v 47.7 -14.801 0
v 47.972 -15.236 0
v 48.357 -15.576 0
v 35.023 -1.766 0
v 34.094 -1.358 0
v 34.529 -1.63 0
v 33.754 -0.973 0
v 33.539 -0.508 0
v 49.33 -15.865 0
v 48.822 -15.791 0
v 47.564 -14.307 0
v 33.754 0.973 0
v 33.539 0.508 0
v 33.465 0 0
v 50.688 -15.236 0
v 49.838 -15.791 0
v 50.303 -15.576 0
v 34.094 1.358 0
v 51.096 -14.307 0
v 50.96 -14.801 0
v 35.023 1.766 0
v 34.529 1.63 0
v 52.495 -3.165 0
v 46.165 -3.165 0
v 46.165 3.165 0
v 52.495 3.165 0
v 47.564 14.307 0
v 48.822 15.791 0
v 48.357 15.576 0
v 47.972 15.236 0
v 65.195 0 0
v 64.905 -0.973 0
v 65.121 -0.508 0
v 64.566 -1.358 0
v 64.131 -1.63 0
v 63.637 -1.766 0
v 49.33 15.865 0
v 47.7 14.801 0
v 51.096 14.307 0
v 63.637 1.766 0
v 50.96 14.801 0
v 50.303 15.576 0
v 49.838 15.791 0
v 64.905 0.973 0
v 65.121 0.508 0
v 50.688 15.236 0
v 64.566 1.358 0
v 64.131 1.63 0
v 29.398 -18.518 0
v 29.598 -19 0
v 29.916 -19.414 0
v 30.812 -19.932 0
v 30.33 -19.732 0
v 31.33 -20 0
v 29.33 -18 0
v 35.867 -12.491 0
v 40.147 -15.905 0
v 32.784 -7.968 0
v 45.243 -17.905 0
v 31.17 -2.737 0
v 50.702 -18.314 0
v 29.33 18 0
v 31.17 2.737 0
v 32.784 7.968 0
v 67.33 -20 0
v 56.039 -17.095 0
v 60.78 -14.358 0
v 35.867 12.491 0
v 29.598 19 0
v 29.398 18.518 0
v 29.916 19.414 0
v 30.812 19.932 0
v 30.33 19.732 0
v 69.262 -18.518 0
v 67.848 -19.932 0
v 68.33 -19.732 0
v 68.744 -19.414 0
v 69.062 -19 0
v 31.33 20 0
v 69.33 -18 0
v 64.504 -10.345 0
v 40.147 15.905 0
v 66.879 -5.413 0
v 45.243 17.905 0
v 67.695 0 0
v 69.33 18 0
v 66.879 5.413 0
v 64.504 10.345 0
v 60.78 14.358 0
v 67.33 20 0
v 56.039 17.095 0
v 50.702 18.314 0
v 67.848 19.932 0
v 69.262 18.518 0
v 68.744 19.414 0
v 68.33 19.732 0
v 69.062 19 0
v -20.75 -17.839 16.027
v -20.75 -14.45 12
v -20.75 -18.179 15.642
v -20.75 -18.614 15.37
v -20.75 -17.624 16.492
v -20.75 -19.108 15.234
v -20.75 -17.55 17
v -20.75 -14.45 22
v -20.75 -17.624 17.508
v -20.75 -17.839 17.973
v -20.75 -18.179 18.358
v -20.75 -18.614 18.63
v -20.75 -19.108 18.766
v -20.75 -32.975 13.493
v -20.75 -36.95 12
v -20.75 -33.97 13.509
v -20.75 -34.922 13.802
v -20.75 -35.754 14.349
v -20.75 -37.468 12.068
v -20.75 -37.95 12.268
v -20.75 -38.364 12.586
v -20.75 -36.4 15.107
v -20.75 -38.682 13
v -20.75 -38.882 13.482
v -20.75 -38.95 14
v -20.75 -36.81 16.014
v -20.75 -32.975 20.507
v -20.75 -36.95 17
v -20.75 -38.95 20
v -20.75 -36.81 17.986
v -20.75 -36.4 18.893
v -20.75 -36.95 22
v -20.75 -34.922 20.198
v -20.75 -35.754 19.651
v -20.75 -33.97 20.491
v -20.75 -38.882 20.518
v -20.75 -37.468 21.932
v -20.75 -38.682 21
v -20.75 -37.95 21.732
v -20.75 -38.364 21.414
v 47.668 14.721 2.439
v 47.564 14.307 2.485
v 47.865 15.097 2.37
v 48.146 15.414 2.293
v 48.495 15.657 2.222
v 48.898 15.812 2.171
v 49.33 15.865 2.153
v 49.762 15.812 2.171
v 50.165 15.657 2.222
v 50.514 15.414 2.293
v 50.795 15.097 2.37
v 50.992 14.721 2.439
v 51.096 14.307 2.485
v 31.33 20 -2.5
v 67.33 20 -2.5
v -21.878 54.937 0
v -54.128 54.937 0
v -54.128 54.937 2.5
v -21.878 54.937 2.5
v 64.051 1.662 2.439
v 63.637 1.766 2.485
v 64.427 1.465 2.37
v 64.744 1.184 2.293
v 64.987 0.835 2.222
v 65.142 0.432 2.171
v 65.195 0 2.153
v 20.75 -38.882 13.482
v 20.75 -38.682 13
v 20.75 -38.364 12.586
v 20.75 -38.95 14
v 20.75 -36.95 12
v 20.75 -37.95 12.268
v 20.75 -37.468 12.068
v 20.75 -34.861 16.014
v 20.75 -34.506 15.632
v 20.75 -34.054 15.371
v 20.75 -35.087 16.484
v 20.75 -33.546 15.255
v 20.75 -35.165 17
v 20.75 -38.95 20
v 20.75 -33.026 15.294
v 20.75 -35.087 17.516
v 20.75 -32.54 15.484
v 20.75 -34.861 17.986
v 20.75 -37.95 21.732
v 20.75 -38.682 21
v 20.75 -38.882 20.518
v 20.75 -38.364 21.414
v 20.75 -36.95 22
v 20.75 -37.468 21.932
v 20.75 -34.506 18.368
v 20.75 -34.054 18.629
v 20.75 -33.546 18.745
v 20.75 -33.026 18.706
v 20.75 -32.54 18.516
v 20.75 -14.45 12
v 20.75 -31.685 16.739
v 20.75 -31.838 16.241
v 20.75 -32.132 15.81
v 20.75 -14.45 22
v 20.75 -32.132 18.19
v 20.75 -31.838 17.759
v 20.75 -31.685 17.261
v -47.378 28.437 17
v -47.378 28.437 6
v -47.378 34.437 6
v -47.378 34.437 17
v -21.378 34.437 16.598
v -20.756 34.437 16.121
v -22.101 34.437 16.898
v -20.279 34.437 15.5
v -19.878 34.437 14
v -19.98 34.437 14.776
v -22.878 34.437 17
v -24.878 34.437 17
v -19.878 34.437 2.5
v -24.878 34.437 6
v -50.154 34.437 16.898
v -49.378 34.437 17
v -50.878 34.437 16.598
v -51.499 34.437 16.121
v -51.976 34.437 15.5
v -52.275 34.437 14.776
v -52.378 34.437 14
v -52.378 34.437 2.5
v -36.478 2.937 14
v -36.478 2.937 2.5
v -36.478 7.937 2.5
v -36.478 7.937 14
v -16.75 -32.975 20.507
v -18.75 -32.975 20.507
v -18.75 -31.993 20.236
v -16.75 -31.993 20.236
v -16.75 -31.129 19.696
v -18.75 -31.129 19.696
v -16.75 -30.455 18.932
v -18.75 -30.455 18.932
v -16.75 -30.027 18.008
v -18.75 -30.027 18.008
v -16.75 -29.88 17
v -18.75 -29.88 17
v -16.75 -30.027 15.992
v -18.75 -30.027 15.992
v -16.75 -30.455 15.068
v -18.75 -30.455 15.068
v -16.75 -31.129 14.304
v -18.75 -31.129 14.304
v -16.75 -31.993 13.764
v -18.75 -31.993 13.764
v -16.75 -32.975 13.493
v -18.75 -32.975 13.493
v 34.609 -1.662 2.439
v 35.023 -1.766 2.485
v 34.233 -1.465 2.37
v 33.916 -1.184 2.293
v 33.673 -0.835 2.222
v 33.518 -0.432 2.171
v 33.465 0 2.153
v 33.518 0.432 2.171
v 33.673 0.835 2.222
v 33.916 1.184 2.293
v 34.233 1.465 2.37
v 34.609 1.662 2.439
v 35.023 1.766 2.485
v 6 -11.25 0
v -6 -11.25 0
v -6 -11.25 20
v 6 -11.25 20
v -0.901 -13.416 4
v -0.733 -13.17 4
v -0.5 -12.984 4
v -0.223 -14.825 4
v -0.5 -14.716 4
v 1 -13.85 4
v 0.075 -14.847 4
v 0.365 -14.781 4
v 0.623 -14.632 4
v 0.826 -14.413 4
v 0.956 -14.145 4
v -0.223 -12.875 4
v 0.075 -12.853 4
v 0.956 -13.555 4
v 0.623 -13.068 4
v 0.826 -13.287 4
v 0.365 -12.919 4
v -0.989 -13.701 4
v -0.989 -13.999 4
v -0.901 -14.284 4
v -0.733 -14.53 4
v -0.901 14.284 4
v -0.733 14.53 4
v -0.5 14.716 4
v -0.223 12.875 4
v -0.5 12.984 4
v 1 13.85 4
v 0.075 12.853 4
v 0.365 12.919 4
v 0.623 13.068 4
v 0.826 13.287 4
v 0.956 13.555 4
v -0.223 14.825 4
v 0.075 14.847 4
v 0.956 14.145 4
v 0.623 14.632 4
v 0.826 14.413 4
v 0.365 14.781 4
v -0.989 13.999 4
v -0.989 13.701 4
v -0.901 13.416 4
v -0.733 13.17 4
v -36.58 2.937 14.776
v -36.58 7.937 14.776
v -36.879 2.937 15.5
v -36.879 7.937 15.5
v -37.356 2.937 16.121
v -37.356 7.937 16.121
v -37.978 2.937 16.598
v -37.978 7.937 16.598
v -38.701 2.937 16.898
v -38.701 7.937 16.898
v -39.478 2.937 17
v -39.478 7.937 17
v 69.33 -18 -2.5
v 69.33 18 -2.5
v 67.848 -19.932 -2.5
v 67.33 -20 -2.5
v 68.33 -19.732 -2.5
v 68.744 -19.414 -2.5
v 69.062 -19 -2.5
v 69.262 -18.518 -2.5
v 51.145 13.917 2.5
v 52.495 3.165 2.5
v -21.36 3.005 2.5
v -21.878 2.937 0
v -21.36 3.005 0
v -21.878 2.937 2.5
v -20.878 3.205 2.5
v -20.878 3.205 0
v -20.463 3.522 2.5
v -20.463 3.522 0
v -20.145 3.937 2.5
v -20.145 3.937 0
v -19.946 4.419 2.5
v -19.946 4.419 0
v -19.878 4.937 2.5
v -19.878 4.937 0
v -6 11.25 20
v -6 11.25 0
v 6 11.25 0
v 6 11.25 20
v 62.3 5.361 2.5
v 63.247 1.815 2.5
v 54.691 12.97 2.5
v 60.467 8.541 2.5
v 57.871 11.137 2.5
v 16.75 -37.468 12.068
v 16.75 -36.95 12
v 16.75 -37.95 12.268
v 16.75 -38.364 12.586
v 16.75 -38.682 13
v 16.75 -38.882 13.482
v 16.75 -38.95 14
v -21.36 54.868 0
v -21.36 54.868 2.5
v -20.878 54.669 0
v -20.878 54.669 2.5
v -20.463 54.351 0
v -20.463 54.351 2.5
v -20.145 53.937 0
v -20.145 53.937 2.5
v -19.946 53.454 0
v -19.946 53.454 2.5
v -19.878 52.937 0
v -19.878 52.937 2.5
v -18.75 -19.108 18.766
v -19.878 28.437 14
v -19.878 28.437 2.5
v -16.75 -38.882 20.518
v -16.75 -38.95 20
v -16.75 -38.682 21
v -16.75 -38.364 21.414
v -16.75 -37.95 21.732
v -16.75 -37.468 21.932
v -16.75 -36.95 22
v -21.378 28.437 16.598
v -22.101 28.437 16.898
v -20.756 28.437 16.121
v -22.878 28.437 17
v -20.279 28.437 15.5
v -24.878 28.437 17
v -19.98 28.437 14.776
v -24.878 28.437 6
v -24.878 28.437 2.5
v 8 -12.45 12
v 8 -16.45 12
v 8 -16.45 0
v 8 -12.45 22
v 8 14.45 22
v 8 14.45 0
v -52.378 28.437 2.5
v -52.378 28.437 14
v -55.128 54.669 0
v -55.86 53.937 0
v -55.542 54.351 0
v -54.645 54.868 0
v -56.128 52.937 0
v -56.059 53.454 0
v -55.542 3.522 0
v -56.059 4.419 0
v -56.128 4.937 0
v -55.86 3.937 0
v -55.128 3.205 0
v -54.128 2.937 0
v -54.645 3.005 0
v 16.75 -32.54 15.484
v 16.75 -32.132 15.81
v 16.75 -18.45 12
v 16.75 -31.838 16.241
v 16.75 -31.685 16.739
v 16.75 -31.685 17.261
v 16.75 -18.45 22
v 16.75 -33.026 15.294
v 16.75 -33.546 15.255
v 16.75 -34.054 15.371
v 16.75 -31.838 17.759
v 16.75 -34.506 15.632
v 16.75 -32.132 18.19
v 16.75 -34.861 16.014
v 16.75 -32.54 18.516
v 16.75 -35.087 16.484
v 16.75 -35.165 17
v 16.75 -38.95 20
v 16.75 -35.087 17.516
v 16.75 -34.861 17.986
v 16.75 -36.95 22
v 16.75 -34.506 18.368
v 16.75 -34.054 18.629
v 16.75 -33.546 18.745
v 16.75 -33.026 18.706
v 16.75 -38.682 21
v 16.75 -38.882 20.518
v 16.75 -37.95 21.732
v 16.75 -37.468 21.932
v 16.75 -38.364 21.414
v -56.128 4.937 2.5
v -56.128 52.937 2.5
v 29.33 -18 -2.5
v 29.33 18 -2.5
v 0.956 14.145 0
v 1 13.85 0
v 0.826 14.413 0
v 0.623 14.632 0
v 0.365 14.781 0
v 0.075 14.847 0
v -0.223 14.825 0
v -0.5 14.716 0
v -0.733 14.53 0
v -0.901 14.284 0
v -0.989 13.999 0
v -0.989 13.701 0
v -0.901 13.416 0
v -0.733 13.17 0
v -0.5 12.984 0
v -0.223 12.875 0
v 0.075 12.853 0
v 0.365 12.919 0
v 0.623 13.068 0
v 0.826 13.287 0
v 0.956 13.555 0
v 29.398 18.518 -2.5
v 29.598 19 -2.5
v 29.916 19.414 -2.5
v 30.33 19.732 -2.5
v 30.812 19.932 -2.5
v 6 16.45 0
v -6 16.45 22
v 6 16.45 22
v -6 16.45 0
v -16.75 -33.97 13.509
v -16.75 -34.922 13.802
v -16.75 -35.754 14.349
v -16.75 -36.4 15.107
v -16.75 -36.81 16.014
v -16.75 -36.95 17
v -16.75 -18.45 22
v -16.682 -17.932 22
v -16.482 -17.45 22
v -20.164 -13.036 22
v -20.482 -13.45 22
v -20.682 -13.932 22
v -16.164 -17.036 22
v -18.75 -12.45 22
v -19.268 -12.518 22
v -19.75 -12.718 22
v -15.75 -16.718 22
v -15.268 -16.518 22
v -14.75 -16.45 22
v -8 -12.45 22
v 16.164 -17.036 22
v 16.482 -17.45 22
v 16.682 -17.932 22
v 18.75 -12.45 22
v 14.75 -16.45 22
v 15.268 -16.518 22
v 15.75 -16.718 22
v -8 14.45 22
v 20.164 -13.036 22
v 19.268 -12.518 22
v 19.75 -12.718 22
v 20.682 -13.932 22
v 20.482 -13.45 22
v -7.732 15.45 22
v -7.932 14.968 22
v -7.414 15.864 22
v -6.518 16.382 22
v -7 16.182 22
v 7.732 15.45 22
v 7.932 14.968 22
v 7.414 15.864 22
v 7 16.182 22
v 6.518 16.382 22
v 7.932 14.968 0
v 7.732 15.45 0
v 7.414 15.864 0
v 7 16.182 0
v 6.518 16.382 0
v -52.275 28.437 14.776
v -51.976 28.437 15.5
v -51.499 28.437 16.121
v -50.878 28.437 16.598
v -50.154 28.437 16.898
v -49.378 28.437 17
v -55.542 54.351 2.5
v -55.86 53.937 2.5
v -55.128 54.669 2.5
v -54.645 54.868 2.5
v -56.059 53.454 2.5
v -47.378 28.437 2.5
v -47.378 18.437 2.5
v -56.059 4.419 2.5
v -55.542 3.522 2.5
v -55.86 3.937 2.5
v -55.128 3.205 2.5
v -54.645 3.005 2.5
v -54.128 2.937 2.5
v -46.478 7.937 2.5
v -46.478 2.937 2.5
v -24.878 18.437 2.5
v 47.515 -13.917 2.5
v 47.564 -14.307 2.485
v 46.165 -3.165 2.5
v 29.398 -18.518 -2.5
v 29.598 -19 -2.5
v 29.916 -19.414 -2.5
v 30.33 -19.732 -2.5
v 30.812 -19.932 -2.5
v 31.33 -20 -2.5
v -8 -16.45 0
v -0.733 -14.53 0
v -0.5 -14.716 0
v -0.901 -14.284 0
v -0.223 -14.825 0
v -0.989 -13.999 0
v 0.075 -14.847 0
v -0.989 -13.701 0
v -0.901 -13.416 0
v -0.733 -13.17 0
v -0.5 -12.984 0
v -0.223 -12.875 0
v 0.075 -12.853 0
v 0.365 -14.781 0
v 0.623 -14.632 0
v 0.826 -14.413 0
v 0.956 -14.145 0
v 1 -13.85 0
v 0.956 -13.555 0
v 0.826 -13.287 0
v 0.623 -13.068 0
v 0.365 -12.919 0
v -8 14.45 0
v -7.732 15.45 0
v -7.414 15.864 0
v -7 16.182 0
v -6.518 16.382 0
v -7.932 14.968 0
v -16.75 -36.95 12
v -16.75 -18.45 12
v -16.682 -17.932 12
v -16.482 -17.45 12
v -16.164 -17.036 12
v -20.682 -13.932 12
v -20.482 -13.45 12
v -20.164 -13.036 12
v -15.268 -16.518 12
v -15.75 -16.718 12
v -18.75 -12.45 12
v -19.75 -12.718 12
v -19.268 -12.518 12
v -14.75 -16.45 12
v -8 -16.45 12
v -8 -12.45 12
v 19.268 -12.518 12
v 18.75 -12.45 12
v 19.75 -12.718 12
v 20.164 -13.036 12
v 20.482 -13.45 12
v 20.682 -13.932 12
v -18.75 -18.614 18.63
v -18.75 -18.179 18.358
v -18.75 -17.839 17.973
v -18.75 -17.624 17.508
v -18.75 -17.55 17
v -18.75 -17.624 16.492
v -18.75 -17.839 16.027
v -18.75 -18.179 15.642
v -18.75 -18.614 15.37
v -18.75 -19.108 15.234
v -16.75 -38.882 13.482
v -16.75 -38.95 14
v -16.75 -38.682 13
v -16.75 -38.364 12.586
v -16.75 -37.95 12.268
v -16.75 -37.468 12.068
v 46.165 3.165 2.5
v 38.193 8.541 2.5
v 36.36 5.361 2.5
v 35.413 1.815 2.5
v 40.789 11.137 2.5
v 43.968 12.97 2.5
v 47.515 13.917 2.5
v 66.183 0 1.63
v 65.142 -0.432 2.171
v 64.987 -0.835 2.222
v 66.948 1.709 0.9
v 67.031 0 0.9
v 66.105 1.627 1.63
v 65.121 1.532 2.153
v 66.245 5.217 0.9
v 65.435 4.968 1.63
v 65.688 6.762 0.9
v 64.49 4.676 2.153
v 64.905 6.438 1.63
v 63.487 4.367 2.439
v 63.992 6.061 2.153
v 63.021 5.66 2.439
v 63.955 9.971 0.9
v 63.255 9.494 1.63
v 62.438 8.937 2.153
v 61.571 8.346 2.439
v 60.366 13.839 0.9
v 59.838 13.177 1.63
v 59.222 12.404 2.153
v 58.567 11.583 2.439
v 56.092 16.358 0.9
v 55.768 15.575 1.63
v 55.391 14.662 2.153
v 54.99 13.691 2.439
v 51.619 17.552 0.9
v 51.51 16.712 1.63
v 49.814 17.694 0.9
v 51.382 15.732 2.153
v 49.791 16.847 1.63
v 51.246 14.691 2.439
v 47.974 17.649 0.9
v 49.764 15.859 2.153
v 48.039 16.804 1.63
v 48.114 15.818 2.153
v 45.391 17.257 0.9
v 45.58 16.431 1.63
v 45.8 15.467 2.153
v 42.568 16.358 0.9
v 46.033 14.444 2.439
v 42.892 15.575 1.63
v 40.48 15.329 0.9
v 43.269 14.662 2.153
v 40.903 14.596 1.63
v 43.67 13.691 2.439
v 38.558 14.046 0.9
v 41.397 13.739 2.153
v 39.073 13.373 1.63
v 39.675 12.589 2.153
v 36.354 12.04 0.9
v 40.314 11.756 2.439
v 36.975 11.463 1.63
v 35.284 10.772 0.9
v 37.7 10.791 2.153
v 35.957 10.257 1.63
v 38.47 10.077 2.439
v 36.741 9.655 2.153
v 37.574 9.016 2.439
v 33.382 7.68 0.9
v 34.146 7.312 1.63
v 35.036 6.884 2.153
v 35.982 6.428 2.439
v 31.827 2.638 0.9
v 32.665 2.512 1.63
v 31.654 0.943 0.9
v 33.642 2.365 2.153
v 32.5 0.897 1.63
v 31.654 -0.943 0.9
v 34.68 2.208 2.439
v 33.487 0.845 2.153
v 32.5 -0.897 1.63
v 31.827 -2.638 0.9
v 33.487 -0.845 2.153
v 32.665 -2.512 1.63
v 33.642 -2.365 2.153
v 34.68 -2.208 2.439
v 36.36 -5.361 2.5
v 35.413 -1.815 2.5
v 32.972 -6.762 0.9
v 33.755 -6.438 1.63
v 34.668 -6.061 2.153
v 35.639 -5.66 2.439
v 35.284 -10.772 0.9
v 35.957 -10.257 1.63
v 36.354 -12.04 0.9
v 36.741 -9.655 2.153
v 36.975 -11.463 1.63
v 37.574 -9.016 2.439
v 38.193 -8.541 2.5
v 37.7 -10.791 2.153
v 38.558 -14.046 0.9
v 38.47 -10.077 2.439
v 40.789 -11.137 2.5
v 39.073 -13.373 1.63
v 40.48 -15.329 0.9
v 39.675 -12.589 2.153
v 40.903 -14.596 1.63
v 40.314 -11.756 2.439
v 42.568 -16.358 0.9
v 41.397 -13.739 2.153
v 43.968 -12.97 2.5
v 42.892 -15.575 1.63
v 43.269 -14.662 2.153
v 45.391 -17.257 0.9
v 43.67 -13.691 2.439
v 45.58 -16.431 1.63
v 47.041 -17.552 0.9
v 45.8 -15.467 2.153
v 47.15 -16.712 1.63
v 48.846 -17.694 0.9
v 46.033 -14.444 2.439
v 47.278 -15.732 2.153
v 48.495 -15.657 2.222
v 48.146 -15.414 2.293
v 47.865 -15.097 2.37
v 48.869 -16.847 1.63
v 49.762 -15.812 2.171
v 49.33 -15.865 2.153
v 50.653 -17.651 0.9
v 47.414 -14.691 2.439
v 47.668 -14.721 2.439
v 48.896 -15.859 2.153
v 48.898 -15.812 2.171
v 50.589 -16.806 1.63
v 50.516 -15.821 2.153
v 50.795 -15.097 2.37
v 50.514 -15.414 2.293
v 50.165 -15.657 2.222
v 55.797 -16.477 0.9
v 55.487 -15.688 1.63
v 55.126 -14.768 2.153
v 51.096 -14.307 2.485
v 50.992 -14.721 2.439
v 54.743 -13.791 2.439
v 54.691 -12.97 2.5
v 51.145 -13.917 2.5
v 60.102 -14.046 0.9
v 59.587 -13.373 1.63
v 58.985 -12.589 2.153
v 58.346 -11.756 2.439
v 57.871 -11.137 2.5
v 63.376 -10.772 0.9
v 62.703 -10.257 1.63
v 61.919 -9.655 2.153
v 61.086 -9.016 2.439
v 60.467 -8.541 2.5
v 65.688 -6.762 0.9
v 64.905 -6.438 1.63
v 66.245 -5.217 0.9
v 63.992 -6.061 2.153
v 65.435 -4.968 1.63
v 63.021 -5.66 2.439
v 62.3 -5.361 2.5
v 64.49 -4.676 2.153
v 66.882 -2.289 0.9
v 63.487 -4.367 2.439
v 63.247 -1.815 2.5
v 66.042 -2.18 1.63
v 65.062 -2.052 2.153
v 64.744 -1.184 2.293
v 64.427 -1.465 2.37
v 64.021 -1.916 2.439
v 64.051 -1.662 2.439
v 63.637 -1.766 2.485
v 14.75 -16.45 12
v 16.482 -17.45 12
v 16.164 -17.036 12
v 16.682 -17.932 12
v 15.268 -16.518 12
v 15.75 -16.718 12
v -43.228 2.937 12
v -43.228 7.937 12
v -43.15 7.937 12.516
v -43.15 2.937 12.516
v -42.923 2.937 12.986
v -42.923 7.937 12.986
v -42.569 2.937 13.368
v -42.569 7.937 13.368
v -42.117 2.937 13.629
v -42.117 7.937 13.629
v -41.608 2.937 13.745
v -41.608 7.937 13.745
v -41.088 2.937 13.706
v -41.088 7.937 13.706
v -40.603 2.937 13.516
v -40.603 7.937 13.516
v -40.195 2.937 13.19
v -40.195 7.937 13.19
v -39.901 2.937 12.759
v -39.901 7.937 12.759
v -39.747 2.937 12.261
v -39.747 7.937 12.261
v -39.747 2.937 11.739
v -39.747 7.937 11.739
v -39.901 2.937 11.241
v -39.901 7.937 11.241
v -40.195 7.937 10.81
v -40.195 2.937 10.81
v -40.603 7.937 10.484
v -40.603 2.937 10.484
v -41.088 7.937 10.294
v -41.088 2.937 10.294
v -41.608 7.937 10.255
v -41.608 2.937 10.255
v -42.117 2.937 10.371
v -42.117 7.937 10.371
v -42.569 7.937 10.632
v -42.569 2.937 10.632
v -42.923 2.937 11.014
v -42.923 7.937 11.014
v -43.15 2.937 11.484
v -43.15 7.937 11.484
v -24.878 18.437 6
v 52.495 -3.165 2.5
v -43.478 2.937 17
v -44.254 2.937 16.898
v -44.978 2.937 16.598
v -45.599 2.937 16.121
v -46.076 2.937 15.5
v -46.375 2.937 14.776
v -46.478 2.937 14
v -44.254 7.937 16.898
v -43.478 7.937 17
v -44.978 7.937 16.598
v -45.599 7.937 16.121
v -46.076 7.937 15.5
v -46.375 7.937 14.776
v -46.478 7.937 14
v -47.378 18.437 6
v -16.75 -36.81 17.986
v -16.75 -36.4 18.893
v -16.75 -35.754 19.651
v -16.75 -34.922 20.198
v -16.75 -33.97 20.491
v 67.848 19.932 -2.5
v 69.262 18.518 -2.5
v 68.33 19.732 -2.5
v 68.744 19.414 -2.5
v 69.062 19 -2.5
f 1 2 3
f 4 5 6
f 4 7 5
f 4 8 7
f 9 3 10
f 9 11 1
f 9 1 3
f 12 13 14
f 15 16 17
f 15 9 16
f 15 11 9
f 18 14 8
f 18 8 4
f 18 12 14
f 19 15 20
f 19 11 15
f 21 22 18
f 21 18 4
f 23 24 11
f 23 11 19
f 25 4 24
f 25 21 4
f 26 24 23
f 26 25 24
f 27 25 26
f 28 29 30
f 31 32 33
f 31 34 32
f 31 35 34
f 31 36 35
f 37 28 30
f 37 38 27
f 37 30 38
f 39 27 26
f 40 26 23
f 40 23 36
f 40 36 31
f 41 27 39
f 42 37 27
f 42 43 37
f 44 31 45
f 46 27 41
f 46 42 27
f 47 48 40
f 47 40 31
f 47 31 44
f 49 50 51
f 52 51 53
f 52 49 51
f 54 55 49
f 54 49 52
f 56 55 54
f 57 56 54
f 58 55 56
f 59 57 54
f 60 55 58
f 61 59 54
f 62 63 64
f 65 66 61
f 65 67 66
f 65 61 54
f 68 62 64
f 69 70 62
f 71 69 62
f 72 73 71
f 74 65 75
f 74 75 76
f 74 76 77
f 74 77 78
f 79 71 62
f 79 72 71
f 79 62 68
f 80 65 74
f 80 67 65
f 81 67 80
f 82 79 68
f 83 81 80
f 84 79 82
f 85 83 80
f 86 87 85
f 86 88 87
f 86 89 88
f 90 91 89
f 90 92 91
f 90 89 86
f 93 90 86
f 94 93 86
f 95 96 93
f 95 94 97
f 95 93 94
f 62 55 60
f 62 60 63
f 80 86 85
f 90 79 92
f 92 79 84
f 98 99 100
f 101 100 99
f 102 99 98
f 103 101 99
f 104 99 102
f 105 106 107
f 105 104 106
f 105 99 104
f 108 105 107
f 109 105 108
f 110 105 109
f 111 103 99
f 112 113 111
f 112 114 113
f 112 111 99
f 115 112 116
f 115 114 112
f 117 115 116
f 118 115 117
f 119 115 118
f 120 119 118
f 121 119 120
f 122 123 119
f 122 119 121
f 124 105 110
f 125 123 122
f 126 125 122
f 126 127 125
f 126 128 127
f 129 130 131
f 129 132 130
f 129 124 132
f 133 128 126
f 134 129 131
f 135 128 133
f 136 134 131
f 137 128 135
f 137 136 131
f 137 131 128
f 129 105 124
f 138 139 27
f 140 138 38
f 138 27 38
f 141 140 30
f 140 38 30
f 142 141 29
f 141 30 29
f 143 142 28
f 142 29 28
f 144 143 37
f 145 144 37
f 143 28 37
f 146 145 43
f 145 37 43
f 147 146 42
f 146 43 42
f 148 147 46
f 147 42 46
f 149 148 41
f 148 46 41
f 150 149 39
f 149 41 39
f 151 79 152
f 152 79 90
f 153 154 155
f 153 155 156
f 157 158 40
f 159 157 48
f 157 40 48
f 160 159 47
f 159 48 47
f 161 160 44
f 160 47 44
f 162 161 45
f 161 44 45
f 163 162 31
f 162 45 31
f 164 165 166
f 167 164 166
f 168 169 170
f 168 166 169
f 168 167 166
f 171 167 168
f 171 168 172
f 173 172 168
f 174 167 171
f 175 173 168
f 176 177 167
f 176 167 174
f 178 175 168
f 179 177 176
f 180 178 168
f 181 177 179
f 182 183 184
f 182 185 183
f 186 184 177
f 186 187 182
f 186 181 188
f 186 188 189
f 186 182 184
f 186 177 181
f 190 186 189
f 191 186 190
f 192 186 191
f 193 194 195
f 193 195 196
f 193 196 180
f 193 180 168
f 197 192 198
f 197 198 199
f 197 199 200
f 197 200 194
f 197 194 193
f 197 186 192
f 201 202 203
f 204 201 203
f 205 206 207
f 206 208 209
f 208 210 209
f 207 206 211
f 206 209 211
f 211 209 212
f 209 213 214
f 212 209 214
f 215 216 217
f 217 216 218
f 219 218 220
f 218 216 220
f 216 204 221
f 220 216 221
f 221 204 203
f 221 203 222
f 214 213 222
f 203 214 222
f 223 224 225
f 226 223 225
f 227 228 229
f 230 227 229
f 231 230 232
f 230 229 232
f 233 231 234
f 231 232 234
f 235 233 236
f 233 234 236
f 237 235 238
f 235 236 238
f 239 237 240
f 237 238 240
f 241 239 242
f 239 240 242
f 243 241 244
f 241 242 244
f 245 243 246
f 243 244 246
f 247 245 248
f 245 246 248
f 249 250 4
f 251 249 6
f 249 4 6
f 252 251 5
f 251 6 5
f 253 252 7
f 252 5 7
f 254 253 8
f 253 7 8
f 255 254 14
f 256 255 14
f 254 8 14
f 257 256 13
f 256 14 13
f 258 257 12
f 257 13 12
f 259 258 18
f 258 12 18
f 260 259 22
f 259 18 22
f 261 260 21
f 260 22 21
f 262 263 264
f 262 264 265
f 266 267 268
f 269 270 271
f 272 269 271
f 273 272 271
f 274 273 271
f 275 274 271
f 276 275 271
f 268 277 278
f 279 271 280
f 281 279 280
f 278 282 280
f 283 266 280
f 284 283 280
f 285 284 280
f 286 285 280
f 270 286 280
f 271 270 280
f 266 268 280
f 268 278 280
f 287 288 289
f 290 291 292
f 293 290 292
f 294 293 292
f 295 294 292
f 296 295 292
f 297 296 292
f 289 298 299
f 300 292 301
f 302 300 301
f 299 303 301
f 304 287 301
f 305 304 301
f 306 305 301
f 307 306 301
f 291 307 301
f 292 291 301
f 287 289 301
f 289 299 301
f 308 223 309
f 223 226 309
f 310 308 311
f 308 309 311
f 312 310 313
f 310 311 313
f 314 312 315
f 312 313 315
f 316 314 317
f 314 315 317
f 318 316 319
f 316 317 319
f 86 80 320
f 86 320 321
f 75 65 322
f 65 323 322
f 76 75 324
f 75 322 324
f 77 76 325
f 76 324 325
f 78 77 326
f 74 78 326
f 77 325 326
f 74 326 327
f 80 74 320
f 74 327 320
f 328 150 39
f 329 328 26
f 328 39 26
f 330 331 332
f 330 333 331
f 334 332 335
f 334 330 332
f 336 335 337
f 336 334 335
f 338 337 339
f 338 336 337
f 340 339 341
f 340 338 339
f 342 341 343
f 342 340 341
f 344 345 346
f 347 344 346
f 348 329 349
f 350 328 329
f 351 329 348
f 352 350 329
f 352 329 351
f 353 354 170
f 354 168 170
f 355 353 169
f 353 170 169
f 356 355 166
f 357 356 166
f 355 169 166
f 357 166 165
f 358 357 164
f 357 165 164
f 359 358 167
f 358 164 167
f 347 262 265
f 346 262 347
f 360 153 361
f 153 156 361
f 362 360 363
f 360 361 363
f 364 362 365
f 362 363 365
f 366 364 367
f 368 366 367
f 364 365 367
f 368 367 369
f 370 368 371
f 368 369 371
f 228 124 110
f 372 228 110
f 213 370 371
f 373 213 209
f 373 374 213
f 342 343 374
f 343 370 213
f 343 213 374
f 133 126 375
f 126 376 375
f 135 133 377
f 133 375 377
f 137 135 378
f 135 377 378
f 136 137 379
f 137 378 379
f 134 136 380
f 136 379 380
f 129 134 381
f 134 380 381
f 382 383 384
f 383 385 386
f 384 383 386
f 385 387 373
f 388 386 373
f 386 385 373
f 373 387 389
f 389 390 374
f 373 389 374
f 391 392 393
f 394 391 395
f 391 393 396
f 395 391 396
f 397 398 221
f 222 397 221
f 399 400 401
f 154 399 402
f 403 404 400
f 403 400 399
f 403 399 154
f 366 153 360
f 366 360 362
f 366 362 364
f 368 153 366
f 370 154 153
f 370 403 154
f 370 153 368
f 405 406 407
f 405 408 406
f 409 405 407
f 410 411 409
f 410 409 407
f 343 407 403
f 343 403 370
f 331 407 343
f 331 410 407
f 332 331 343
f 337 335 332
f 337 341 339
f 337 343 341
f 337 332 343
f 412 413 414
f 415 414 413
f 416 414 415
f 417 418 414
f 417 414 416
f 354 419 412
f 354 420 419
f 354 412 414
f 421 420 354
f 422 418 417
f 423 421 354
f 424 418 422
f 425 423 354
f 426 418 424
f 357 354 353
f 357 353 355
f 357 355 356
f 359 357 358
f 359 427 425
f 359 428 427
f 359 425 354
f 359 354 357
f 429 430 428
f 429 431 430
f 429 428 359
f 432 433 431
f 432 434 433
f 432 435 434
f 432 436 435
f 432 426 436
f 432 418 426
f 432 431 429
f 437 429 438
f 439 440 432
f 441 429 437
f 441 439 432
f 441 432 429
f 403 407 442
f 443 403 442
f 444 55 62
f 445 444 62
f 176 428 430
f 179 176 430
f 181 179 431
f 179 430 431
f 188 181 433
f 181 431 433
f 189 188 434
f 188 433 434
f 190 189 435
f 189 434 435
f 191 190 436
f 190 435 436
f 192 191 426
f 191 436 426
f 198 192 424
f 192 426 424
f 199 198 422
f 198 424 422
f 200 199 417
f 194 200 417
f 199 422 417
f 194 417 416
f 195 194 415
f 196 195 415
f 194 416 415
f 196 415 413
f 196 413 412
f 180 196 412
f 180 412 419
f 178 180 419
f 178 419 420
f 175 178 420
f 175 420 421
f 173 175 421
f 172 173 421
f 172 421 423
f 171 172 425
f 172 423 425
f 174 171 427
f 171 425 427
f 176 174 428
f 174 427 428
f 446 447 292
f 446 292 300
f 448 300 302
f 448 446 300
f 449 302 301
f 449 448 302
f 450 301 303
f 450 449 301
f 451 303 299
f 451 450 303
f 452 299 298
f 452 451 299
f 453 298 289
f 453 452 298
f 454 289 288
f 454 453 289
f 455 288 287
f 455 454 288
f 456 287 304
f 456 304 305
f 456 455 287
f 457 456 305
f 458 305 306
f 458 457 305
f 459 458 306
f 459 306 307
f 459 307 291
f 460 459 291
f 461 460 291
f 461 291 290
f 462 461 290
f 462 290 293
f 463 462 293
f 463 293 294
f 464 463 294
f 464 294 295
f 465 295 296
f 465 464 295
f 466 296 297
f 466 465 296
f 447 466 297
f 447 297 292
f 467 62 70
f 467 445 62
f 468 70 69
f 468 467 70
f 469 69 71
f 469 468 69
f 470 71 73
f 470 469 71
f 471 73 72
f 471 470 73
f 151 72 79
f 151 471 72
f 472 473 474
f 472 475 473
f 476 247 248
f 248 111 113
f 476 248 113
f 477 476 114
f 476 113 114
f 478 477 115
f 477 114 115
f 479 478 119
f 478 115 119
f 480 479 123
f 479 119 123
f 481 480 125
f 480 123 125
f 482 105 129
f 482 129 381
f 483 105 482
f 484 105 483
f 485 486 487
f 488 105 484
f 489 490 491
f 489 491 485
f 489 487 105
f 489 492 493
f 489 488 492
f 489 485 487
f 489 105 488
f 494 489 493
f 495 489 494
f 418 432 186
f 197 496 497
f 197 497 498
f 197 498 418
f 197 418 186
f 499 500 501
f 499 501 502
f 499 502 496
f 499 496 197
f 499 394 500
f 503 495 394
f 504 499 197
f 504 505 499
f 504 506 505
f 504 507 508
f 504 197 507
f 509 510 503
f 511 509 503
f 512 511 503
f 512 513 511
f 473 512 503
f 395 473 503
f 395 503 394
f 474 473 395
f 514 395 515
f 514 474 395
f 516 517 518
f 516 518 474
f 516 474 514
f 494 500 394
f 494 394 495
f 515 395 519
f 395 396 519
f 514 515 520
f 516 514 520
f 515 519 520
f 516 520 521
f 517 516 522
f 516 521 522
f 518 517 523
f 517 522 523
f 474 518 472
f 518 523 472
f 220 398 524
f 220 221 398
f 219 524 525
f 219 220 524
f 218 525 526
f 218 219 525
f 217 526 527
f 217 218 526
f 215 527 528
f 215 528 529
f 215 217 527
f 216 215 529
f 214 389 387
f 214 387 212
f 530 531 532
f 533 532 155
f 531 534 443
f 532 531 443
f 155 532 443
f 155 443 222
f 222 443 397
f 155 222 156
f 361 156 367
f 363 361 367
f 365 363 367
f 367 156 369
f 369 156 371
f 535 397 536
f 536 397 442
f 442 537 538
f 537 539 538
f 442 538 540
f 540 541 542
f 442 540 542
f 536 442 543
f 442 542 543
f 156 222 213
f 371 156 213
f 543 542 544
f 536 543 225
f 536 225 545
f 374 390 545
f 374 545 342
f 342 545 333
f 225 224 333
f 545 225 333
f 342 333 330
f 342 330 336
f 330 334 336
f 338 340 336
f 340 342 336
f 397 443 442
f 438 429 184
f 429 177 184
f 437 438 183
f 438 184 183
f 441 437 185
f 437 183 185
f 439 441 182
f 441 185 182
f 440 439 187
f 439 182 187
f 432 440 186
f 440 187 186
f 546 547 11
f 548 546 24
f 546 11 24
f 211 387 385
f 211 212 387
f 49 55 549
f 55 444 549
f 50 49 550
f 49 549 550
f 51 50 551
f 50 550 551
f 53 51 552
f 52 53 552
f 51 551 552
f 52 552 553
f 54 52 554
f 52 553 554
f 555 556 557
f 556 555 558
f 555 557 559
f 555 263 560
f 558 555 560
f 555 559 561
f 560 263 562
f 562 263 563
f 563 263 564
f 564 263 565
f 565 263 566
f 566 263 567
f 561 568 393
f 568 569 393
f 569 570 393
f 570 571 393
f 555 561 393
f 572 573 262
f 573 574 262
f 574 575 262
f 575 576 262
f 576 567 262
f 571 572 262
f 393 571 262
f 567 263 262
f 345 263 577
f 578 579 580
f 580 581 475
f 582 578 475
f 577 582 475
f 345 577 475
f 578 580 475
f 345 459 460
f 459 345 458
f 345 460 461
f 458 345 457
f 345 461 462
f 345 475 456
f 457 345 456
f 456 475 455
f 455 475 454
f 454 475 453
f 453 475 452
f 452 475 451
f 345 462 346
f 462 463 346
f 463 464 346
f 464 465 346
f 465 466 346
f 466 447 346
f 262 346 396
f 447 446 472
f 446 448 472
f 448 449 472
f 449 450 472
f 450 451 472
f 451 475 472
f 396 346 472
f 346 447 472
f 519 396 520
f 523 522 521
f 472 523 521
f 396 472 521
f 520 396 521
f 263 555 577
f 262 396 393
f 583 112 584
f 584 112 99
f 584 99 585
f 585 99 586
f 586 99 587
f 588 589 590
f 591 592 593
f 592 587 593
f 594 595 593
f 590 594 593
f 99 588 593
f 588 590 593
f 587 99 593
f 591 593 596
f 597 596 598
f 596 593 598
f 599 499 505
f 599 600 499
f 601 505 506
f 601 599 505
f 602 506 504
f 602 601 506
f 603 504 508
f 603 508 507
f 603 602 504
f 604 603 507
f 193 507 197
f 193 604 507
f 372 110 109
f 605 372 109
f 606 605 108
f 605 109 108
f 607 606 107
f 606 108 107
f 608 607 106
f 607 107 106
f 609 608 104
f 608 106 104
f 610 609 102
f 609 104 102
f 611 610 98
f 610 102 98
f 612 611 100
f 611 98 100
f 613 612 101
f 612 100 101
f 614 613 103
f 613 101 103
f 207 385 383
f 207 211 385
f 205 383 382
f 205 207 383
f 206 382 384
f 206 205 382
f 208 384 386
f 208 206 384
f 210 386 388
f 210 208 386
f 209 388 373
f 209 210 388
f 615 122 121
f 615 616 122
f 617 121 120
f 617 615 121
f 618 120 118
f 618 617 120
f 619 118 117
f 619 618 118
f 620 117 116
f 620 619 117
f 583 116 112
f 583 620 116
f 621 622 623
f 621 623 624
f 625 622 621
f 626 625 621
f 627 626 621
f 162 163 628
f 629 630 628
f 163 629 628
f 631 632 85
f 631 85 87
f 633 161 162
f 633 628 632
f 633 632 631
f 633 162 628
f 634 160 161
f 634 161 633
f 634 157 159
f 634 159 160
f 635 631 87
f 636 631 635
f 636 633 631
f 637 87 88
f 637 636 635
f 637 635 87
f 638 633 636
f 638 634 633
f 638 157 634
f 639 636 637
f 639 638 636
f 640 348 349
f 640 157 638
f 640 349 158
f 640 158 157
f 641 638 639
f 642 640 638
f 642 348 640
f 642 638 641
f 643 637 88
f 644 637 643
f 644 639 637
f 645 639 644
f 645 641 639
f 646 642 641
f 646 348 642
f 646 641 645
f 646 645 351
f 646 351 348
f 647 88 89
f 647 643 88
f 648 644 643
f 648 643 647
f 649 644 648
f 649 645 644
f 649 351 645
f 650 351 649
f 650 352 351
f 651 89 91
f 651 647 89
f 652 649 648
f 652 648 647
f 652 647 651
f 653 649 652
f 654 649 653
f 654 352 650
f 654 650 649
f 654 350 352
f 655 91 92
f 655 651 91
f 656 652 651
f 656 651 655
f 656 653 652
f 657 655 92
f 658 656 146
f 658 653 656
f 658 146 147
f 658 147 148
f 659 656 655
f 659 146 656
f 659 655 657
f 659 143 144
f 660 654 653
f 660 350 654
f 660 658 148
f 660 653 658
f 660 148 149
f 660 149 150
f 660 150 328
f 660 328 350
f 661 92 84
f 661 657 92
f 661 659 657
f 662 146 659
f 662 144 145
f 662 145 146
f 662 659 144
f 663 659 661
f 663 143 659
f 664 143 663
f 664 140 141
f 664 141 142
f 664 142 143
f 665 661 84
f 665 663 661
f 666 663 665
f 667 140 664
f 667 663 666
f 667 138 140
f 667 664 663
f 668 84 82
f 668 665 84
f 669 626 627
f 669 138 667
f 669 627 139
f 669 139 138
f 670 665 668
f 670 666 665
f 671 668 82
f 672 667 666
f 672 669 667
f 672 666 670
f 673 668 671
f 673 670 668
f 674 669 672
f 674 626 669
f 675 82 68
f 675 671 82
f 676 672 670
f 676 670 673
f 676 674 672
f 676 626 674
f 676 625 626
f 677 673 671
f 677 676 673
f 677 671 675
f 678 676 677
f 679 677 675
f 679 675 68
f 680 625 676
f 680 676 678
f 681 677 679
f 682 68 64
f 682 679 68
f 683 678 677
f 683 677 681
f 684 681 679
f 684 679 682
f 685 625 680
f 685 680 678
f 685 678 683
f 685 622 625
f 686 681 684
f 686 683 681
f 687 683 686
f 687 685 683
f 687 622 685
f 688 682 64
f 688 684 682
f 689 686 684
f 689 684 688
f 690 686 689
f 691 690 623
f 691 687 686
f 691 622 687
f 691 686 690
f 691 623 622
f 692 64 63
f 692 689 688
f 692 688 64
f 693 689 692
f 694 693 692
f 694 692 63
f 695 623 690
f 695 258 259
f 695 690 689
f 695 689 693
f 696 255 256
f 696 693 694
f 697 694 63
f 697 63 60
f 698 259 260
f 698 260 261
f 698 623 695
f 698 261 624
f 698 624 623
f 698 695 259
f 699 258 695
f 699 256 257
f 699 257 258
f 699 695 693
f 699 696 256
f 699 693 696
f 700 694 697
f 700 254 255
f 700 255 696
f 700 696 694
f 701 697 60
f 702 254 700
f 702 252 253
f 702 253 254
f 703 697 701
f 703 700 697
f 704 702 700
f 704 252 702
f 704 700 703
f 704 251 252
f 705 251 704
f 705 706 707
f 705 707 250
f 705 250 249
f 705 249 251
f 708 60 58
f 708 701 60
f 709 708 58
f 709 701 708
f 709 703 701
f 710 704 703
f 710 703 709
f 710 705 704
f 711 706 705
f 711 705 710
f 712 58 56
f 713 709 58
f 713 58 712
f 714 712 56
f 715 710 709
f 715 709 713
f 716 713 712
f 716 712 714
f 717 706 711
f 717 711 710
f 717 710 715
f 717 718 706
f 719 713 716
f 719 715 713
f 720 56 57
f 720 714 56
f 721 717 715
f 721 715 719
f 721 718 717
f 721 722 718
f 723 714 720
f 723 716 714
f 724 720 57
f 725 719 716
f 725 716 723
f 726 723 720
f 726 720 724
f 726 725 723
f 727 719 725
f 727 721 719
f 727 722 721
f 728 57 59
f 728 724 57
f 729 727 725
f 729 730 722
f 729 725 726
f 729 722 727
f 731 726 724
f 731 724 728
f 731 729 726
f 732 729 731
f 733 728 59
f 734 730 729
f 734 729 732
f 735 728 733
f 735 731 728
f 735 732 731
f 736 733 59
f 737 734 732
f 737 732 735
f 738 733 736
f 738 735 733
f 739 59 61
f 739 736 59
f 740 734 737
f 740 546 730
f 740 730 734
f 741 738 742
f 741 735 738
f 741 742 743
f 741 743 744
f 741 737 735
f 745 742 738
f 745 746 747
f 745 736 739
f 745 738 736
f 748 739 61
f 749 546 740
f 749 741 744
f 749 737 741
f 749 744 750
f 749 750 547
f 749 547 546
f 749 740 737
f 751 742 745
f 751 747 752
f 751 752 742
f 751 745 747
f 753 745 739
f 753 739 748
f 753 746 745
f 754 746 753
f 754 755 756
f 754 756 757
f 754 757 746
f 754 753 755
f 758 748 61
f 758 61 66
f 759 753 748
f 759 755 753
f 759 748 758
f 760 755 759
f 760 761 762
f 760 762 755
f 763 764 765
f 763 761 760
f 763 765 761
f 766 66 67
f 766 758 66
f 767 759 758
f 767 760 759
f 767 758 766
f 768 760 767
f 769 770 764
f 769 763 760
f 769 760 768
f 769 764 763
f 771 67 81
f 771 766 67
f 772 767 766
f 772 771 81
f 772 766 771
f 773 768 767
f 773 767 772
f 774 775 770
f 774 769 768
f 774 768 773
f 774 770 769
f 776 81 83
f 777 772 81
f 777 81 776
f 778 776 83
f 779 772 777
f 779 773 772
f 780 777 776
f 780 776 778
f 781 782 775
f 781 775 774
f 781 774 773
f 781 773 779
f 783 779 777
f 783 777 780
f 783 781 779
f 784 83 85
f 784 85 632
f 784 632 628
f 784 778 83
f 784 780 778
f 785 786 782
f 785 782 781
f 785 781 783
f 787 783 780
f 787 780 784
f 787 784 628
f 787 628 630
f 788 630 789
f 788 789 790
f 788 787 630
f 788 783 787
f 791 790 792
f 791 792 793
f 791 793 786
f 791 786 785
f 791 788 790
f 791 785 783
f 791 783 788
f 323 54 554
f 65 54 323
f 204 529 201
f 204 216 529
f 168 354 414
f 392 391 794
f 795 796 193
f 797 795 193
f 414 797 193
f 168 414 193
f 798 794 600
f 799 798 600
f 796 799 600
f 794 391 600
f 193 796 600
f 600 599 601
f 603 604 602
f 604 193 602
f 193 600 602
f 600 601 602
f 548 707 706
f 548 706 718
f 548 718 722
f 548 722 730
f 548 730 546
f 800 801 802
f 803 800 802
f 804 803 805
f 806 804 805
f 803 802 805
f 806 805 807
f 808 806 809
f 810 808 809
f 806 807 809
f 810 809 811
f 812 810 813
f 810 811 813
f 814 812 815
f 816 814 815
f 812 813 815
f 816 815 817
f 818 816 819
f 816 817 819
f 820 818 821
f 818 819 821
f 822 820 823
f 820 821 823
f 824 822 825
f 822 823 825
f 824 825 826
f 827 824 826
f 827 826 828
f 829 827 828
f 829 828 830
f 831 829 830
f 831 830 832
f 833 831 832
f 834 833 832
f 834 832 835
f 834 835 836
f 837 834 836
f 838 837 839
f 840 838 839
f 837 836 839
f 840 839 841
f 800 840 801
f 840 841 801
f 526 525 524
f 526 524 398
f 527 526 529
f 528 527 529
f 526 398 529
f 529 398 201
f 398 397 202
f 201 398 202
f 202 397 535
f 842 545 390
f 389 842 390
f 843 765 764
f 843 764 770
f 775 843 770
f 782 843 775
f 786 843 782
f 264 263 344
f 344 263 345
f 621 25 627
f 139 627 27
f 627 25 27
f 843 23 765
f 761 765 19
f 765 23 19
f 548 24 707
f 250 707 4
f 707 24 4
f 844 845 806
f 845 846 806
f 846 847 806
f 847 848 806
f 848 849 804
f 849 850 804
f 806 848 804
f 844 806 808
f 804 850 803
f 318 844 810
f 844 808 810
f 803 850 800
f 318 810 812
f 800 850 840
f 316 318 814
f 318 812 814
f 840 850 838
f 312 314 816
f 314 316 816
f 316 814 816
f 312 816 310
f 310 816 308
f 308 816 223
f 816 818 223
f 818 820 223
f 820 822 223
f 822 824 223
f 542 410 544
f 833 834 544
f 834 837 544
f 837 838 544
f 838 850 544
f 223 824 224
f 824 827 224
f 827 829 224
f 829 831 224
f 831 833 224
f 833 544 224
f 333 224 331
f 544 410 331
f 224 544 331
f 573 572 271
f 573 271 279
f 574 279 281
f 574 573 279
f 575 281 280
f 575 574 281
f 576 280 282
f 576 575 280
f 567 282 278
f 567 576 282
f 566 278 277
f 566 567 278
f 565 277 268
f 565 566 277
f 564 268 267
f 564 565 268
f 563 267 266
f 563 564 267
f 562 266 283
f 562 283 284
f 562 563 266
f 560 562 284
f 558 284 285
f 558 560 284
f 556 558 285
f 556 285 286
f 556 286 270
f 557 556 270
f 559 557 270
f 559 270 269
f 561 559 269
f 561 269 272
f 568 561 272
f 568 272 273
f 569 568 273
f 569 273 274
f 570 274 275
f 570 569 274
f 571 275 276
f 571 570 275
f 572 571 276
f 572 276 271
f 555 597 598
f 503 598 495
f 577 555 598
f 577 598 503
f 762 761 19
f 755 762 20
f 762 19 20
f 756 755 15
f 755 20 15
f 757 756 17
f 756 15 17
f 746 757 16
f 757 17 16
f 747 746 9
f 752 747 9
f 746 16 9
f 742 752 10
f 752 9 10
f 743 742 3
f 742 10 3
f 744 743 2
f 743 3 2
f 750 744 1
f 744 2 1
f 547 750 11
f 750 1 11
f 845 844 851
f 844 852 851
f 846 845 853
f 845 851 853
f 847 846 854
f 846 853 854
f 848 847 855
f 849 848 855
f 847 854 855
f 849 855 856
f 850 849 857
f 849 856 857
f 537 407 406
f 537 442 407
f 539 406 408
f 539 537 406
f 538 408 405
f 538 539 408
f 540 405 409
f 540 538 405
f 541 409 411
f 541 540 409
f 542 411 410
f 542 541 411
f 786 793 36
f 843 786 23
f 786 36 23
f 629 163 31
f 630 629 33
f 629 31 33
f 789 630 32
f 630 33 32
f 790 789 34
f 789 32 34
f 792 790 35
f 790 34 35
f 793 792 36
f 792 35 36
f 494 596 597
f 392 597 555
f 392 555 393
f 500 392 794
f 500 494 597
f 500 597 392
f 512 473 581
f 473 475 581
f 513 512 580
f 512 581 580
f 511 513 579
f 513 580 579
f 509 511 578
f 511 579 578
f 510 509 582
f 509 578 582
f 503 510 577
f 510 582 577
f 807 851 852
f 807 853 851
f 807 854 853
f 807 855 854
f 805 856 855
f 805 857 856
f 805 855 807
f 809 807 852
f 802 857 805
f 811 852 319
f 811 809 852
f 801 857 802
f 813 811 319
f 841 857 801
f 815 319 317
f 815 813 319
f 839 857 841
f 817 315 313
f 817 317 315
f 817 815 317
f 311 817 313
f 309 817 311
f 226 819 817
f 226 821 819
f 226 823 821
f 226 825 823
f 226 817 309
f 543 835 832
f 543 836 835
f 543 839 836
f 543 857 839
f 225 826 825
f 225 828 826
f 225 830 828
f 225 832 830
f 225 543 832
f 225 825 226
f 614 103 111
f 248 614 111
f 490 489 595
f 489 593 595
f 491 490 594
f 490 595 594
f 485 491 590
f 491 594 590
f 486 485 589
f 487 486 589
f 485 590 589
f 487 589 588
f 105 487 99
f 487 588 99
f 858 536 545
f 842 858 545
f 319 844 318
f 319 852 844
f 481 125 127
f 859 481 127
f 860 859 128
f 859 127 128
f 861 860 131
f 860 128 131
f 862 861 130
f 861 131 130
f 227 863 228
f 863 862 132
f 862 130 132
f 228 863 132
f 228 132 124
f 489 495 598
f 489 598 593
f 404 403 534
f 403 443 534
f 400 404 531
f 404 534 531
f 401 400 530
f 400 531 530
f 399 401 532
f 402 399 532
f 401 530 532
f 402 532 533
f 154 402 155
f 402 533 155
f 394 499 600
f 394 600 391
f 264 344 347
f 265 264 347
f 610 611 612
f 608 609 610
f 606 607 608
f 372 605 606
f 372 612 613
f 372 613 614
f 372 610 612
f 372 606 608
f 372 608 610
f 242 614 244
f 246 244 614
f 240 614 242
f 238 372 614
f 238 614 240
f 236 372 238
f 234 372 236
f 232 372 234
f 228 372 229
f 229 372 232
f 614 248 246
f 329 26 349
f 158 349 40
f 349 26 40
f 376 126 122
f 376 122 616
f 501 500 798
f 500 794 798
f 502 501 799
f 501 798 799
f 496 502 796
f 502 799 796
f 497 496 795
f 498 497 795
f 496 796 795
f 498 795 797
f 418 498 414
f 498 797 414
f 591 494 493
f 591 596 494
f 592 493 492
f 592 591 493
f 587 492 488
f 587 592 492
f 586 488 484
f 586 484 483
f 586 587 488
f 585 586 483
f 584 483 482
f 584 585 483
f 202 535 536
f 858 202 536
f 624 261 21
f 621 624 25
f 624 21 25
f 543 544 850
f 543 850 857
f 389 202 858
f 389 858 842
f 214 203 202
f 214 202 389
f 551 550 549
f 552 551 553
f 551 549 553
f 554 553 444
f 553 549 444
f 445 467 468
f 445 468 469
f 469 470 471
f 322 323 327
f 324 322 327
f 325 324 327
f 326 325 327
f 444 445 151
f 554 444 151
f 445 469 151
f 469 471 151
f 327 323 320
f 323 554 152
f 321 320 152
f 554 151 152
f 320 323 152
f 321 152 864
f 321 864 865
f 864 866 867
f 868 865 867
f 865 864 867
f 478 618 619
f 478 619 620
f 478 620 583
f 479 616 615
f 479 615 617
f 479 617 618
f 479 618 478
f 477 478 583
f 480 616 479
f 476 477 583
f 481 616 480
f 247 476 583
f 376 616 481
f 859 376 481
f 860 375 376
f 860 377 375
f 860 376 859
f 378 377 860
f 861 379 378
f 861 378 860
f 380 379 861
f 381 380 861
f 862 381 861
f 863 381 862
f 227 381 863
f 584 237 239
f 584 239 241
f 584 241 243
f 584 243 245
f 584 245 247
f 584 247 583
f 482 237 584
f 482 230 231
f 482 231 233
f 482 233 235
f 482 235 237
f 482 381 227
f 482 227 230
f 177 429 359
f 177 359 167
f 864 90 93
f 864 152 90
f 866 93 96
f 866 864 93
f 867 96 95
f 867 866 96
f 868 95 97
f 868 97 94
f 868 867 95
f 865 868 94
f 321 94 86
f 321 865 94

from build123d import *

# Parameters (mm, degrees)
F0_W      = 16
F0_H      = 32.9
F0_R      = 1
F0_W_2    = 12
F0_H_2    = 22.5
F1_DEPTH  = 20
F2_DEPTH  = 4
F3_W      = 16
F3_H      = 32.9
F4_DEPTH  = 2
F6_DEPTH  = 10
F7_R      = 2
F9_DEPTH  = 2
F10_DEPTH = 4
F11_W     = 40
F11_H     = 40
F12_DEPTH = 2.5
F13_W     = 5
F13_H     = 6
F13_W_2   = 10
F13_H_2   = 5
F14_DEPTH = 14.5
F15_DEPTH = 3.5
F16_R     = 3
F17_DEPTH = 12
F18_DEPTH = 3.75
F19_R     = 1.75
F20_DEPTH = 4
F21_R     = 1.75
F22_DEPTH = 5
F23_W     = 40
F23_H     = 40
F24_DEPTH = 2.5
F25_R     = 18.365
F26_DEPTH = 2.5
F28_R     = 2
F29_R     = 2


# Not quite as in the source:
# - a fillet or chamfer that OpenCascade refuses, or shapes differently, is made with other operations: its cross-section is extruded or revolved along the edge and cut away or added


with BuildPart() as f1:
    # F0 (on Top) → F1 (new body)
    with BuildSketch(Plane.XY):
        Rectangle(F0_W, F0_H)
        with Locations((0, -13.85)):
            Circle(F0_R, mode=Mode.SUBTRACT)
        Rectangle(F0_W_2, F0_H_2, mode=Mode.SUBTRACT)
        with Locations((0, 13.85)):
            Circle(F0_R, mode=Mode.SUBTRACT)
        with Locations((0, 13.85)):
            Circle(F0_R)
        with Locations((0, -13.85)):
            Circle(F0_R)
    extrude(amount=F1_DEPTH)

    # F0 (on Top) → F2 (cut)
    with BuildSketch(Plane.XY):
        with Locations((0, 13.85)):
            Circle(F0_R)
        with Locations((0, -13.85)):
            Circle(F0_R)
    extrude(amount=F2_DEPTH, mode=Mode.SUBTRACT)

    # F3 (on face) → F4 (join)
    with BuildSketch(Plane.XY.offset(20)):
        Rectangle(F3_W, F3_H)
    extrude(amount=F4_DEPTH)

    # F5 (on face) → F6 (join)
    with BuildSketch(Plane.XY.offset(22)):
        Polygon((8, -12.45), (8, -16.45), (16.75, -16.45), (16.75, -38.95), (20.75, -38.95), (20.75, -12.45), align=None)
        Polygon((-16.75, -38.95), (-16.75, -16.45), (-8, -16.45), (-8, -12.45), (-20.75, -12.45), (-20.75, -38.95), align=None)
    extrude(amount=-F6_DEPTH)

    # F7
    f7_edges = [f1.edges().sort_by_distance(p)[0] for p in [
        (-20.75, -12.45, 17),
        (20.75, -12.45, 17),
        (18.75, -38.95, 22),
        (18.75, -38.95, 12),
        (-18.75, -38.95, 22),
        (-18.75, -38.95, 12),
        (-16.75, -16.45, 17),
        (16.75, -16.45, 17),
        (-8, 16.45, 11),
        (8, 16.45, 11),
    ]]
    fillet(f7_edges, radius=F7_R)

    # F8 (on face) → F9 (cut)
    with BuildSketch(Plane(origin=(-20.75, 0, 0), x_dir=(0, -1, 0), z_dir=(-1, 0, 0))):
        with BuildLine():
            ThreePointArc((21.11, 17), (20.5076279836, 18.3347630248), (19.1082108626, 18.7661284151))
            ThreePointArc((19.1082108626, 18.7661284151), (17.55, 17), (19.1082108626, 15.2338715849))
            ThreePointArc((19.1082108626, 15.2338715849), (20.5076279836, 15.6652369752), (21.11, 17))
        make_face()
        with BuildLine():
            ThreePointArc((32.9745367412, 13.4925483442), (29.88, 17), (32.9745367412, 20.5074516558))
            Line((32.9745367412, 20.5074516558), (19.1082108626, 18.7661284151))
            ThreePointArc((19.1082108626, 18.7661284151), (20.5076279836, 18.3347630248), (21.11, 17))
            ThreePointArc((21.11, 17), (20.5076279836, 15.6652369752), (19.1082108626, 15.2338715849))
            Line((19.1082108626, 15.2338715849), (32.9745367412, 13.4925483442))
        make_face()
        with BuildLine():
            ThreePointArc((32.9745367412, 13.4925483442), (35.7537162483, 14.3492206222), (36.95, 17))
            ThreePointArc((36.95, 17), (35.7537162483, 19.6507793778), (32.9745367412, 20.5074516558))
            ThreePointArc((32.9745367412, 20.5074516558), (29.88, 17), (32.9745367412, 13.4925483442))
        make_face()
    extrude(amount=-F9_DEPTH, mode=Mode.SUBTRACT)

    # F8 (on face) → F10 (cut, through all)
    with BuildSketch(Plane(origin=(-20.75, 0, 0), x_dir=(0, -1, 0), z_dir=(-1, 0, 0))):
        with BuildLine():
            ThreePointArc((32.9745367412, 13.4925483442), (35.7537162483, 14.3492206222), (36.95, 17))
            ThreePointArc((36.95, 17), (35.7537162483, 19.6507793778), (32.9745367412, 20.5074516558))
            ThreePointArc((32.9745367412, 20.5074516558), (29.88, 17), (32.9745367412, 13.4925483442))
        make_face()
    extrude(amount=-F10_DEPTH, mode=Mode.SUBTRACT)

    # F19 (on face) → F20 (cut, through all)
    with BuildSketch(Plane(origin=(16.75, 0, 0), x_dir=(0, -1, 0), z_dir=(-1, 0, 0))):
        with Locations((33.415, 17)):
            Circle(F19_R)
    extrude(amount=-F20_DEPTH, mode=Mode.SUBTRACT)


with BuildPart() as f12:
    # F11 (on Top) → F12 (new body)
    with BuildSketch(Plane.XY):
        with Locations((-36.1275146902, 22.9365597665)):
            Rectangle(F11_W, F11_H)
    extrude(amount=F12_DEPTH)

    # F13 (on face) → F14 (join)
    with BuildSketch(Plane.XY.offset(2.5)):
        with Locations((-49.8775146902, 31.4365597665)):
            Rectangle(F13_W, F13_H)
        with Locations((-22.3775146902, 31.4365597665)):
            Rectangle(F13_W, F13_H)
        with Locations((-41.4775146902, 5.4365597665)):
            Rectangle(F13_W_2, F13_H_2)
    extrude(amount=F14_DEPTH)

    # F13 (on face) → F15 (join)
    with BuildSketch(Plane.XY.offset(2.5)):
        Polygon((-24.8775146902, 34.4365597665), (-47.3775146902, 34.4365597665), (-47.3775146902, 28.4365597665), (-47.3775146902, 18.4365597665), (-24.8775146902, 18.4365597665), (-24.8775146902, 28.4365597665), align=None)
    extrude(amount=F15_DEPTH)

    # F16
    f16_edges = [f12.edges().sort_by_distance(p)[0] for p in [
        (-52.377515, 31.43656, 17),
        (-19.877515, 31.43656, 17),
        (-46.477515, 5.43656, 17),
        (-36.477515, 5.43656, 17),
    ]]
    fillet(f16_edges, radius=F16_R)

    # F17 (add): a face of the model
    f17_faces = [f12.faces().sort_by_distance(p)[0] for p in [
        (-36.1275146902, 42.9365597665, 1.25),
    ]]
    extrude(f17_faces, amount=F17_DEPTH)

    # F18 (cut, through all): a face of the model
    f18_faces = [f12.faces().sort_by_distance(p)[0] for p in [
        (-16.1275146902, 28.9365597665, 1.25),
    ]]
    extrude(f18_faces, amount=-F18_DEPTH, mode=Mode.SUBTRACT)

    # F21 (on face) → F22 (cut, through all)
    with BuildSketch(Plane(origin=(0, 7.9365597665, 0), x_dir=(-1, 0, 0), z_dir=(0, 1, 0))):
        with Locations((41.4775146902, 12)):
            Circle(F21_R)
    extrude(amount=-F22_DEPTH, mode=Mode.SUBTRACT)

    # F29
    f29_edges = [f12.edges().sort_by_distance(p)[0] for p in [
        (-56.127515, 2.93656, 1.25),
        (-19.877515, 2.93656, 1.25),
        (-19.877515, 54.93656, 1.25),
        (-56.127515, 54.93656, 1.25),
    ]]
    fillet(f29_edges, radius=F29_R)


with BuildPart() as f24:
    # F23 (on Top) → F24 (new body)
    with BuildSketch(Plane.XY):
        with Locations((49.3299849331, 0)):
            Rectangle(F23_W, F23_H)
        with BuildLine():
            ThreePointArc((35.0231957958, -1.7661284151), (33.4649849331, 0), (35.0231957958, 1.7661284151))
            Line((35.0231957958, 1.7661284151), (46.164712816, 3.1652721172))
            Line((46.164712816, 3.1652721172), (47.5638565181, 14.3067891374))
            ThreePointArc((47.5638565181, 14.3067891374), (49.3299849331, 15.865), (51.0961133482, 14.3067891374))
            Line((51.0961133482, 14.3067891374), (52.4952570503, 3.1652721172))
            Line((52.4952570503, 3.1652721172), (63.6367740705, 1.7661284151))
            ThreePointArc((63.6367740705, 1.7661284151), (64.7497479579, 1.1776279836), (65.1949849331, 0))
            ThreePointArc((65.1949849331, 0), (64.7497479579, -1.1776279836), (63.6367740705, -1.7661284151))
            Line((63.6367740705, -1.7661284151), (52.4952570503, -3.1652721172))
            Line((52.4952570503, -3.1652721172), (51.0961133482, -14.3067891374))
            ThreePointArc((51.0961133482, -14.3067891374), (49.3299849331, -15.865), (47.5638565181, -14.3067891374))
            Line((47.5638565181, -14.3067891374), (46.164712816, -3.1652721172))
            Line((46.164712816, -3.1652721172), (35.0231957958, -1.7661284151))
        make_face(mode=Mode.SUBTRACT)
        with BuildLine():
            ThreePointArc((35.0231957958, 1.7661284151), (36.4226129167, 1.3347630248), (37.0249849331, 0))
            ThreePointArc((37.0249849331, 0), (36.4226129167, -1.3347630248), (35.0231957958, -1.7661284151))
            Line((35.0231957958, -1.7661284151), (46.164712816, -3.1652721172))
            Line((46.164712816, -3.1652721172), (47.5638565181, -14.3067891374))
            ThreePointArc((47.5638565181, -14.3067891374), (49.21887368, -12.308471281), (51.1099849331, -14.085))
            ThreePointArc((51.1099849331, -14.085), (51.1065136521, -14.1961112532), (51.0961133482, -14.3067891374))
            Line((51.0961133482, -14.3067891374), (52.4952570503, -3.1652721172))
            Line((52.4952570503, -3.1652721172), (63.6367740705, -1.7661284151))
            ThreePointArc((63.6367740705, -1.7661284151), (61.6349849331, 0), (63.6367740705, 1.7661284151))
            Line((63.6367740705, 1.7661284151), (52.4952570503, 3.1652721172))
            Line((52.4952570503, 3.1652721172), (51.0961133482, 14.3067891374))
            ThreePointArc((51.0961133482, 14.3067891374), (51.1065136521, 14.1961112532), (51.1099849331, 14.085))
            ThreePointArc((51.1099849331, 14.085), (49.21887368, 12.308471281), (47.5638565181, 14.3067891374))
            Line((47.5638565181, 14.3067891374), (46.164712816, 3.1652721172))
            Line((46.164712816, 3.1652721172), (35.0231957958, 1.7661284151))
        make_face()
        with BuildLine():
            ThreePointArc((51.0961133482, 14.3067891374), (49.3299849331, 15.865), (47.5638565181, 14.3067891374))
            ThreePointArc((47.5638565181, 14.3067891374), (49.21887368, 12.308471281), (51.1099849331, 14.085))
            ThreePointArc((51.1099849331, 14.085), (51.1065136521, 14.1961112532), (51.0961133482, 14.3067891374))
        make_face()
        with BuildLine():
            ThreePointArc((35.0231957958, -1.7661284151), (36.4226129167, -1.3347630248), (37.0249849331, 0))
            ThreePointArc((37.0249849331, 0), (36.4226129167, 1.3347630248), (35.0231957958, 1.7661284151))
            ThreePointArc((35.0231957958, 1.7661284151), (33.4649849331, 0), (35.0231957958, -1.7661284151))
        make_face()
        with BuildLine():
            ThreePointArc((51.1099849331, -14.085), (49.21887368, -12.308471281), (47.5638565181, -14.3067891374))
            ThreePointArc((47.5638565181, -14.3067891374), (49.3299849331, -15.865), (51.0961133482, -14.3067891374))
            ThreePointArc((51.0961133482, -14.3067891374), (51.1065136521, -14.1961112532), (51.1099849331, -14.085))
        make_face()
        with BuildLine():
            ThreePointArc((65.1949849331, 0), (64.7497479579, 1.1776279836), (63.6367740705, 1.7661284151))
            ThreePointArc((63.6367740705, 1.7661284151), (61.6349849331, 0), (63.6367740705, -1.7661284151))
            ThreePointArc((63.6367740705, -1.7661284151), (64.7497479579, -1.1776279836), (65.1949849331, 0))
        make_face()
    extrude(amount=-F24_DEPTH)

    # F25 (on face) → F26 (join)
    with BuildSketch(Plane.XY):
        with Locations((49.3299849331, 0)):
            Circle(F25_R)
        with BuildLine():
            Line((46.164712816, -3.1652721172), (35.0231957958, -1.7661284151))
            ThreePointArc((35.0231957958, -1.7661284151), (33.4649849331, 0), (35.0231957958, 1.7661284151))
            Line((35.0231957958, 1.7661284151), (46.164712816, 3.1652721172))
            Line((46.164712816, 3.1652721172), (47.5638565181, 14.3067891374))
            ThreePointArc((47.5638565181, 14.3067891374), (49.3299849331, 15.865), (51.0961133482, 14.3067891374))
            Line((51.0961133482, 14.3067891374), (52.4952570503, 3.1652721172))
            Line((52.4952570503, 3.1652721172), (63.6367740705, 1.7661284151))
            ThreePointArc((63.6367740705, 1.7661284151), (64.7497479579, 1.1776279836), (65.1949849331, 0))
            ThreePointArc((65.1949849331, 0), (64.7497479579, -1.1776279836), (63.6367740705, -1.7661284151))
            Line((63.6367740705, -1.7661284151), (52.4952570503, -3.1652721172))
            Line((52.4952570503, -3.1652721172), (51.0961133482, -14.3067891374))
            ThreePointArc((51.0961133482, -14.3067891374), (49.3299849331, -15.865), (47.5638565181, -14.3067891374))
            Line((47.5638565181, -14.3067891374), (46.164712816, -3.1652721172))
        make_face(mode=Mode.SUBTRACT)
    extrude(amount=F26_DEPTH)

    # F27: fillet of radius 5 on 1 edges, made by hand

    # F27_s1 → F27_t2 (revolve, cut)
    with BuildSketch(Plane.XZ):
        with BuildLine():
            ThreePointArc((67.6949849331, 0), (65.8648579142, 1.8301270189), (63.3648579142, 2.5))
            Line((63.3648579142, 2.5), (67.6949849331, 2.5))
            Line((67.6949849331, 2.5), (67.6949849331, 0))
        make_face()
    revolve(axis=Axis((49.3299849331, 0, 2.5), (0, 0, 1)), mode=Mode.SUBTRACT)

    # F28
    f28_edges = [f24.edges().sort_by_distance(p)[0] for p in [
        (29.329985, 20, -1.25),
        (69.329985, 20, -1.25),
        (69.329985, -20, -1.25),
        (29.329985, -20, -1.25),
    ]]
    fillet(f28_edges, radius=F28_R)


solid = Compound([f1.part, f12.part, f24.part])
